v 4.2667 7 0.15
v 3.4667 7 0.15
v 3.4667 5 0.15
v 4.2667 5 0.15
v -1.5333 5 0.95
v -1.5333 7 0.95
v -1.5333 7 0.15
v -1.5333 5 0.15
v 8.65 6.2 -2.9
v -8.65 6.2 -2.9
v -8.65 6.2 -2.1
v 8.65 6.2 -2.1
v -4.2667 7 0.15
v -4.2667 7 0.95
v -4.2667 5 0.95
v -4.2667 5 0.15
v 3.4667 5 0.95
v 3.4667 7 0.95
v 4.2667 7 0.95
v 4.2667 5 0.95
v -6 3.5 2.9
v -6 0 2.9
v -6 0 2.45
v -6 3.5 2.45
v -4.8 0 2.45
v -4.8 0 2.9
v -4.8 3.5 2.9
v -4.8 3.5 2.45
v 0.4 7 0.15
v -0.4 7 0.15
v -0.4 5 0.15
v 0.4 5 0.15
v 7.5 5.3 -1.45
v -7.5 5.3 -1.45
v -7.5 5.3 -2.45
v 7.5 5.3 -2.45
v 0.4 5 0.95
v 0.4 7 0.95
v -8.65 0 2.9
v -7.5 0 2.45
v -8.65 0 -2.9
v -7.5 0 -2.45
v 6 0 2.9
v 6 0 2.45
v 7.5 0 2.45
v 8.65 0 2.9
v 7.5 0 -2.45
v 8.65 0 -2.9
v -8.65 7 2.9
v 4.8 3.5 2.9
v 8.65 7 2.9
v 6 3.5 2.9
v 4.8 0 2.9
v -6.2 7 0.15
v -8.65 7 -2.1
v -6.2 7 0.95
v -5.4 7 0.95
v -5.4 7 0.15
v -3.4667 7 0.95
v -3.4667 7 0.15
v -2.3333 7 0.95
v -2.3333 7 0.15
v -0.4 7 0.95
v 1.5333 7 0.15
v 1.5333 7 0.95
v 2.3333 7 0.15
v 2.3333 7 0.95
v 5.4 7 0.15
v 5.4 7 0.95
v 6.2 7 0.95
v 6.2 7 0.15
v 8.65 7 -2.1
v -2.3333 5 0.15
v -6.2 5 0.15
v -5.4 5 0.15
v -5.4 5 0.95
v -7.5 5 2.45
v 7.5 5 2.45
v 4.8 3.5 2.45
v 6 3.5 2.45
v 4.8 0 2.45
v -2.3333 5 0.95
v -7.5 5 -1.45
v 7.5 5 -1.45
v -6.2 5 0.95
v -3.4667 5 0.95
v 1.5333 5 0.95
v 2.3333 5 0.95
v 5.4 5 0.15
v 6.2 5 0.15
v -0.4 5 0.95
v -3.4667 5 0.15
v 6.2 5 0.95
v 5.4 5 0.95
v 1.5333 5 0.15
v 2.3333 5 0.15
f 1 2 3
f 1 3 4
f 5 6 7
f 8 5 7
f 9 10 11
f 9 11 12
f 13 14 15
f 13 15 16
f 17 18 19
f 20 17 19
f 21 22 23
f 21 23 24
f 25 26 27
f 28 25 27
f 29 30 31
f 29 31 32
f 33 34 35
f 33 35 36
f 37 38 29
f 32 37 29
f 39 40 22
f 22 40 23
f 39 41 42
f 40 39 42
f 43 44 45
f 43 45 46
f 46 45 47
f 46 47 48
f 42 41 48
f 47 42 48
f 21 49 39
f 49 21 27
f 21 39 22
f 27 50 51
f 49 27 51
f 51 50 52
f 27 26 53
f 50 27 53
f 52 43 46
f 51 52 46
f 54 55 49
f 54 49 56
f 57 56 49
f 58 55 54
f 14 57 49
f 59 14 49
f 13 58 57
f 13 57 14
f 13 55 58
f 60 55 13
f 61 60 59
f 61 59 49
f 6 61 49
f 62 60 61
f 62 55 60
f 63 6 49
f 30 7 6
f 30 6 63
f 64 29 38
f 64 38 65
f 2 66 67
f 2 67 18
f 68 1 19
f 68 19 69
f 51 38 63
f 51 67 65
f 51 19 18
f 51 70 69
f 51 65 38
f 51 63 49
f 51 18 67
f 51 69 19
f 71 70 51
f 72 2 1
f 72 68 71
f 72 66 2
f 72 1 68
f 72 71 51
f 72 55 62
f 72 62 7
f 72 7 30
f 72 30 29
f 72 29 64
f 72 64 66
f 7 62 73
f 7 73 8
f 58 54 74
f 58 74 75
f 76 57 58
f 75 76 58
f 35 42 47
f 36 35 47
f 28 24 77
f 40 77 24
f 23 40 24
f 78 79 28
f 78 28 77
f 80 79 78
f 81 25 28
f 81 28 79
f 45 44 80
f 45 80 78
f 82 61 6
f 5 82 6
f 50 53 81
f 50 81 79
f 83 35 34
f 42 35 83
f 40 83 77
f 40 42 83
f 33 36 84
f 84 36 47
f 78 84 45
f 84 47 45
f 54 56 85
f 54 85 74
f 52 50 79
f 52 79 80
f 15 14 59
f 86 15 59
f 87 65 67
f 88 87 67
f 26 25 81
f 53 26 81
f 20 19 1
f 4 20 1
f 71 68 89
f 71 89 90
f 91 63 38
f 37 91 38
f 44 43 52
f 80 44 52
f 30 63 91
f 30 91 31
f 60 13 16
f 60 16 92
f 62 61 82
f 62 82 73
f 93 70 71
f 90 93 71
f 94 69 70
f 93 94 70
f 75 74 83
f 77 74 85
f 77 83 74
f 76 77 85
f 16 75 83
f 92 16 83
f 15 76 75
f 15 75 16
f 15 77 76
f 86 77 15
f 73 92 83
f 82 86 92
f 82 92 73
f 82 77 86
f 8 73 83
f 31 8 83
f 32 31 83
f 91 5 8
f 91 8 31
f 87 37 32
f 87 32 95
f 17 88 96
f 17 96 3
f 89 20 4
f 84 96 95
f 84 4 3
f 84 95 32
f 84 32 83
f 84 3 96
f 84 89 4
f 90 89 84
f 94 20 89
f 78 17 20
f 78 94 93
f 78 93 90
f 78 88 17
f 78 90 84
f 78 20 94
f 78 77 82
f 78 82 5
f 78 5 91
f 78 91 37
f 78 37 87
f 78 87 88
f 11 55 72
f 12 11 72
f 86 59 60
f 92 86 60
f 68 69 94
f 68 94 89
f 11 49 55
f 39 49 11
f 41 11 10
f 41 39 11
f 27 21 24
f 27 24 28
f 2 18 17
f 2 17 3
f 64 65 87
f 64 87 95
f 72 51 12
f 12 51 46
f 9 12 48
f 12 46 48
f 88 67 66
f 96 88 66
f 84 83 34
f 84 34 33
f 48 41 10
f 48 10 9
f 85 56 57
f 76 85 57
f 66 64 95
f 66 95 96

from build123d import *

# Parameters (mm, degrees)
SKETCH1_W           = 17.3
SKETCH1_H           = 5.8
BOSS_EXTRUDE1_DEPTH = 7
SKETCH3_W           = 15
SKETCH3_H           = 4.9
CUT_EXTRUDE1_DEPTH  = 5
SKETCH4_W           = 1.2
SKETCH4_H           = 3.5
CUT_EXTRUDE2_DEPTH  = 4
SKETCH5_W           = 17.3
SKETCH5_H           = 0.8
CUT_EXTRUDE3_DEPTH  = 0.8
SKETCH6_W           = 0.8
SKETCH6_H           = 0.8
CUT_EXTRUDE4_DEPTH  = 10
SKETCH7_W           = 15
SKETCH7_H           = 1
CUT_EXTRUDE5_DEPTH  = 0.3


with BuildPart() as part:
    # Sketch1 → Boss-Extrude1 (new body)
    with BuildSketch(Plane(origin=(0, 0, 0), x_dir=(1, 0, 0), z_dir=(0, 1, 0))):
        Rectangle(SKETCH1_W, SKETCH1_H)
    extrude(amount=BOSS_EXTRUDE1_DEPTH)

    # Sketch3 → Cut-Extrude1 (cut)
    with BuildSketch(Plane.XZ):
        Rectangle(SKETCH3_W, SKETCH3_H)
    extrude(amount=-CUT_EXTRUDE1_DEPTH, mode=Mode.SUBTRACT)

    # Sketch4 → Cut-Extrude2 (cut)
    with BuildSketch(Plane.XY.offset(2.9)):
        with Locations((-5.4, 1.75)):
            Rectangle(SKETCH4_W, SKETCH4_H)
        with Locations((5.4, 1.75)):
            Rectangle(SKETCH4_W, SKETCH4_H)
    extrude(amount=-CUT_EXTRUDE2_DEPTH, mode=Mode.SUBTRACT)

    # Sketch5 → Cut-Extrude3 (cut)
    with BuildSketch(Plane(origin=(0, 7, 0), x_dir=(1, 0, 0), z_dir=(0, 1, 0))):
        with Locations((0, 2.5)):
            Rectangle(SKETCH5_W, SKETCH5_H)
    extrude(amount=-CUT_EXTRUDE3_DEPTH, mode=Mode.SUBTRACT)

    # Sketch6 → Cut-Extrude4 (cut)
    with BuildSketch(Plane(origin=(0, 7, 0), x_dir=(1, 0, 0), z_dir=(0, 1, 0))):
        with Locations((5.8, -0.55)):
            Rectangle(SKETCH6_W, SKETCH6_H)
        with Locations((3.866666667, -0.55)):
            Rectangle(SKETCH6_W, SKETCH6_H)
        with Locations((1.933333333, -0.55)):
            Rectangle(SKETCH6_W, SKETCH6_H)
        with Locations((0, -0.55)):
            Rectangle(SKETCH6_W, SKETCH6_H)
        with Locations((-1.933333333, -0.55)):
            Rectangle(SKETCH6_W, SKETCH6_H)
        with Locations((-3.866666667, -0.55)):
            Rectangle(SKETCH6_W, SKETCH6_H)
        with Locations((-5.8, -0.55)):
            Rectangle(SKETCH6_W, SKETCH6_H)
    extrude(amount=-CUT_EXTRUDE4_DEPTH, mode=Mode.SUBTRACT)

    # Sketch7 → Cut-Extrude5 (cut)
    with BuildSketch(Plane.XZ.offset(-5)):
        with Locations((0, -1.95)):
            Rectangle(SKETCH7_W, SKETCH7_H)
    extrude(amount=-CUT_EXTRUDE5_DEPTH, mode=Mode.SUBTRACT)


solid = part.part
